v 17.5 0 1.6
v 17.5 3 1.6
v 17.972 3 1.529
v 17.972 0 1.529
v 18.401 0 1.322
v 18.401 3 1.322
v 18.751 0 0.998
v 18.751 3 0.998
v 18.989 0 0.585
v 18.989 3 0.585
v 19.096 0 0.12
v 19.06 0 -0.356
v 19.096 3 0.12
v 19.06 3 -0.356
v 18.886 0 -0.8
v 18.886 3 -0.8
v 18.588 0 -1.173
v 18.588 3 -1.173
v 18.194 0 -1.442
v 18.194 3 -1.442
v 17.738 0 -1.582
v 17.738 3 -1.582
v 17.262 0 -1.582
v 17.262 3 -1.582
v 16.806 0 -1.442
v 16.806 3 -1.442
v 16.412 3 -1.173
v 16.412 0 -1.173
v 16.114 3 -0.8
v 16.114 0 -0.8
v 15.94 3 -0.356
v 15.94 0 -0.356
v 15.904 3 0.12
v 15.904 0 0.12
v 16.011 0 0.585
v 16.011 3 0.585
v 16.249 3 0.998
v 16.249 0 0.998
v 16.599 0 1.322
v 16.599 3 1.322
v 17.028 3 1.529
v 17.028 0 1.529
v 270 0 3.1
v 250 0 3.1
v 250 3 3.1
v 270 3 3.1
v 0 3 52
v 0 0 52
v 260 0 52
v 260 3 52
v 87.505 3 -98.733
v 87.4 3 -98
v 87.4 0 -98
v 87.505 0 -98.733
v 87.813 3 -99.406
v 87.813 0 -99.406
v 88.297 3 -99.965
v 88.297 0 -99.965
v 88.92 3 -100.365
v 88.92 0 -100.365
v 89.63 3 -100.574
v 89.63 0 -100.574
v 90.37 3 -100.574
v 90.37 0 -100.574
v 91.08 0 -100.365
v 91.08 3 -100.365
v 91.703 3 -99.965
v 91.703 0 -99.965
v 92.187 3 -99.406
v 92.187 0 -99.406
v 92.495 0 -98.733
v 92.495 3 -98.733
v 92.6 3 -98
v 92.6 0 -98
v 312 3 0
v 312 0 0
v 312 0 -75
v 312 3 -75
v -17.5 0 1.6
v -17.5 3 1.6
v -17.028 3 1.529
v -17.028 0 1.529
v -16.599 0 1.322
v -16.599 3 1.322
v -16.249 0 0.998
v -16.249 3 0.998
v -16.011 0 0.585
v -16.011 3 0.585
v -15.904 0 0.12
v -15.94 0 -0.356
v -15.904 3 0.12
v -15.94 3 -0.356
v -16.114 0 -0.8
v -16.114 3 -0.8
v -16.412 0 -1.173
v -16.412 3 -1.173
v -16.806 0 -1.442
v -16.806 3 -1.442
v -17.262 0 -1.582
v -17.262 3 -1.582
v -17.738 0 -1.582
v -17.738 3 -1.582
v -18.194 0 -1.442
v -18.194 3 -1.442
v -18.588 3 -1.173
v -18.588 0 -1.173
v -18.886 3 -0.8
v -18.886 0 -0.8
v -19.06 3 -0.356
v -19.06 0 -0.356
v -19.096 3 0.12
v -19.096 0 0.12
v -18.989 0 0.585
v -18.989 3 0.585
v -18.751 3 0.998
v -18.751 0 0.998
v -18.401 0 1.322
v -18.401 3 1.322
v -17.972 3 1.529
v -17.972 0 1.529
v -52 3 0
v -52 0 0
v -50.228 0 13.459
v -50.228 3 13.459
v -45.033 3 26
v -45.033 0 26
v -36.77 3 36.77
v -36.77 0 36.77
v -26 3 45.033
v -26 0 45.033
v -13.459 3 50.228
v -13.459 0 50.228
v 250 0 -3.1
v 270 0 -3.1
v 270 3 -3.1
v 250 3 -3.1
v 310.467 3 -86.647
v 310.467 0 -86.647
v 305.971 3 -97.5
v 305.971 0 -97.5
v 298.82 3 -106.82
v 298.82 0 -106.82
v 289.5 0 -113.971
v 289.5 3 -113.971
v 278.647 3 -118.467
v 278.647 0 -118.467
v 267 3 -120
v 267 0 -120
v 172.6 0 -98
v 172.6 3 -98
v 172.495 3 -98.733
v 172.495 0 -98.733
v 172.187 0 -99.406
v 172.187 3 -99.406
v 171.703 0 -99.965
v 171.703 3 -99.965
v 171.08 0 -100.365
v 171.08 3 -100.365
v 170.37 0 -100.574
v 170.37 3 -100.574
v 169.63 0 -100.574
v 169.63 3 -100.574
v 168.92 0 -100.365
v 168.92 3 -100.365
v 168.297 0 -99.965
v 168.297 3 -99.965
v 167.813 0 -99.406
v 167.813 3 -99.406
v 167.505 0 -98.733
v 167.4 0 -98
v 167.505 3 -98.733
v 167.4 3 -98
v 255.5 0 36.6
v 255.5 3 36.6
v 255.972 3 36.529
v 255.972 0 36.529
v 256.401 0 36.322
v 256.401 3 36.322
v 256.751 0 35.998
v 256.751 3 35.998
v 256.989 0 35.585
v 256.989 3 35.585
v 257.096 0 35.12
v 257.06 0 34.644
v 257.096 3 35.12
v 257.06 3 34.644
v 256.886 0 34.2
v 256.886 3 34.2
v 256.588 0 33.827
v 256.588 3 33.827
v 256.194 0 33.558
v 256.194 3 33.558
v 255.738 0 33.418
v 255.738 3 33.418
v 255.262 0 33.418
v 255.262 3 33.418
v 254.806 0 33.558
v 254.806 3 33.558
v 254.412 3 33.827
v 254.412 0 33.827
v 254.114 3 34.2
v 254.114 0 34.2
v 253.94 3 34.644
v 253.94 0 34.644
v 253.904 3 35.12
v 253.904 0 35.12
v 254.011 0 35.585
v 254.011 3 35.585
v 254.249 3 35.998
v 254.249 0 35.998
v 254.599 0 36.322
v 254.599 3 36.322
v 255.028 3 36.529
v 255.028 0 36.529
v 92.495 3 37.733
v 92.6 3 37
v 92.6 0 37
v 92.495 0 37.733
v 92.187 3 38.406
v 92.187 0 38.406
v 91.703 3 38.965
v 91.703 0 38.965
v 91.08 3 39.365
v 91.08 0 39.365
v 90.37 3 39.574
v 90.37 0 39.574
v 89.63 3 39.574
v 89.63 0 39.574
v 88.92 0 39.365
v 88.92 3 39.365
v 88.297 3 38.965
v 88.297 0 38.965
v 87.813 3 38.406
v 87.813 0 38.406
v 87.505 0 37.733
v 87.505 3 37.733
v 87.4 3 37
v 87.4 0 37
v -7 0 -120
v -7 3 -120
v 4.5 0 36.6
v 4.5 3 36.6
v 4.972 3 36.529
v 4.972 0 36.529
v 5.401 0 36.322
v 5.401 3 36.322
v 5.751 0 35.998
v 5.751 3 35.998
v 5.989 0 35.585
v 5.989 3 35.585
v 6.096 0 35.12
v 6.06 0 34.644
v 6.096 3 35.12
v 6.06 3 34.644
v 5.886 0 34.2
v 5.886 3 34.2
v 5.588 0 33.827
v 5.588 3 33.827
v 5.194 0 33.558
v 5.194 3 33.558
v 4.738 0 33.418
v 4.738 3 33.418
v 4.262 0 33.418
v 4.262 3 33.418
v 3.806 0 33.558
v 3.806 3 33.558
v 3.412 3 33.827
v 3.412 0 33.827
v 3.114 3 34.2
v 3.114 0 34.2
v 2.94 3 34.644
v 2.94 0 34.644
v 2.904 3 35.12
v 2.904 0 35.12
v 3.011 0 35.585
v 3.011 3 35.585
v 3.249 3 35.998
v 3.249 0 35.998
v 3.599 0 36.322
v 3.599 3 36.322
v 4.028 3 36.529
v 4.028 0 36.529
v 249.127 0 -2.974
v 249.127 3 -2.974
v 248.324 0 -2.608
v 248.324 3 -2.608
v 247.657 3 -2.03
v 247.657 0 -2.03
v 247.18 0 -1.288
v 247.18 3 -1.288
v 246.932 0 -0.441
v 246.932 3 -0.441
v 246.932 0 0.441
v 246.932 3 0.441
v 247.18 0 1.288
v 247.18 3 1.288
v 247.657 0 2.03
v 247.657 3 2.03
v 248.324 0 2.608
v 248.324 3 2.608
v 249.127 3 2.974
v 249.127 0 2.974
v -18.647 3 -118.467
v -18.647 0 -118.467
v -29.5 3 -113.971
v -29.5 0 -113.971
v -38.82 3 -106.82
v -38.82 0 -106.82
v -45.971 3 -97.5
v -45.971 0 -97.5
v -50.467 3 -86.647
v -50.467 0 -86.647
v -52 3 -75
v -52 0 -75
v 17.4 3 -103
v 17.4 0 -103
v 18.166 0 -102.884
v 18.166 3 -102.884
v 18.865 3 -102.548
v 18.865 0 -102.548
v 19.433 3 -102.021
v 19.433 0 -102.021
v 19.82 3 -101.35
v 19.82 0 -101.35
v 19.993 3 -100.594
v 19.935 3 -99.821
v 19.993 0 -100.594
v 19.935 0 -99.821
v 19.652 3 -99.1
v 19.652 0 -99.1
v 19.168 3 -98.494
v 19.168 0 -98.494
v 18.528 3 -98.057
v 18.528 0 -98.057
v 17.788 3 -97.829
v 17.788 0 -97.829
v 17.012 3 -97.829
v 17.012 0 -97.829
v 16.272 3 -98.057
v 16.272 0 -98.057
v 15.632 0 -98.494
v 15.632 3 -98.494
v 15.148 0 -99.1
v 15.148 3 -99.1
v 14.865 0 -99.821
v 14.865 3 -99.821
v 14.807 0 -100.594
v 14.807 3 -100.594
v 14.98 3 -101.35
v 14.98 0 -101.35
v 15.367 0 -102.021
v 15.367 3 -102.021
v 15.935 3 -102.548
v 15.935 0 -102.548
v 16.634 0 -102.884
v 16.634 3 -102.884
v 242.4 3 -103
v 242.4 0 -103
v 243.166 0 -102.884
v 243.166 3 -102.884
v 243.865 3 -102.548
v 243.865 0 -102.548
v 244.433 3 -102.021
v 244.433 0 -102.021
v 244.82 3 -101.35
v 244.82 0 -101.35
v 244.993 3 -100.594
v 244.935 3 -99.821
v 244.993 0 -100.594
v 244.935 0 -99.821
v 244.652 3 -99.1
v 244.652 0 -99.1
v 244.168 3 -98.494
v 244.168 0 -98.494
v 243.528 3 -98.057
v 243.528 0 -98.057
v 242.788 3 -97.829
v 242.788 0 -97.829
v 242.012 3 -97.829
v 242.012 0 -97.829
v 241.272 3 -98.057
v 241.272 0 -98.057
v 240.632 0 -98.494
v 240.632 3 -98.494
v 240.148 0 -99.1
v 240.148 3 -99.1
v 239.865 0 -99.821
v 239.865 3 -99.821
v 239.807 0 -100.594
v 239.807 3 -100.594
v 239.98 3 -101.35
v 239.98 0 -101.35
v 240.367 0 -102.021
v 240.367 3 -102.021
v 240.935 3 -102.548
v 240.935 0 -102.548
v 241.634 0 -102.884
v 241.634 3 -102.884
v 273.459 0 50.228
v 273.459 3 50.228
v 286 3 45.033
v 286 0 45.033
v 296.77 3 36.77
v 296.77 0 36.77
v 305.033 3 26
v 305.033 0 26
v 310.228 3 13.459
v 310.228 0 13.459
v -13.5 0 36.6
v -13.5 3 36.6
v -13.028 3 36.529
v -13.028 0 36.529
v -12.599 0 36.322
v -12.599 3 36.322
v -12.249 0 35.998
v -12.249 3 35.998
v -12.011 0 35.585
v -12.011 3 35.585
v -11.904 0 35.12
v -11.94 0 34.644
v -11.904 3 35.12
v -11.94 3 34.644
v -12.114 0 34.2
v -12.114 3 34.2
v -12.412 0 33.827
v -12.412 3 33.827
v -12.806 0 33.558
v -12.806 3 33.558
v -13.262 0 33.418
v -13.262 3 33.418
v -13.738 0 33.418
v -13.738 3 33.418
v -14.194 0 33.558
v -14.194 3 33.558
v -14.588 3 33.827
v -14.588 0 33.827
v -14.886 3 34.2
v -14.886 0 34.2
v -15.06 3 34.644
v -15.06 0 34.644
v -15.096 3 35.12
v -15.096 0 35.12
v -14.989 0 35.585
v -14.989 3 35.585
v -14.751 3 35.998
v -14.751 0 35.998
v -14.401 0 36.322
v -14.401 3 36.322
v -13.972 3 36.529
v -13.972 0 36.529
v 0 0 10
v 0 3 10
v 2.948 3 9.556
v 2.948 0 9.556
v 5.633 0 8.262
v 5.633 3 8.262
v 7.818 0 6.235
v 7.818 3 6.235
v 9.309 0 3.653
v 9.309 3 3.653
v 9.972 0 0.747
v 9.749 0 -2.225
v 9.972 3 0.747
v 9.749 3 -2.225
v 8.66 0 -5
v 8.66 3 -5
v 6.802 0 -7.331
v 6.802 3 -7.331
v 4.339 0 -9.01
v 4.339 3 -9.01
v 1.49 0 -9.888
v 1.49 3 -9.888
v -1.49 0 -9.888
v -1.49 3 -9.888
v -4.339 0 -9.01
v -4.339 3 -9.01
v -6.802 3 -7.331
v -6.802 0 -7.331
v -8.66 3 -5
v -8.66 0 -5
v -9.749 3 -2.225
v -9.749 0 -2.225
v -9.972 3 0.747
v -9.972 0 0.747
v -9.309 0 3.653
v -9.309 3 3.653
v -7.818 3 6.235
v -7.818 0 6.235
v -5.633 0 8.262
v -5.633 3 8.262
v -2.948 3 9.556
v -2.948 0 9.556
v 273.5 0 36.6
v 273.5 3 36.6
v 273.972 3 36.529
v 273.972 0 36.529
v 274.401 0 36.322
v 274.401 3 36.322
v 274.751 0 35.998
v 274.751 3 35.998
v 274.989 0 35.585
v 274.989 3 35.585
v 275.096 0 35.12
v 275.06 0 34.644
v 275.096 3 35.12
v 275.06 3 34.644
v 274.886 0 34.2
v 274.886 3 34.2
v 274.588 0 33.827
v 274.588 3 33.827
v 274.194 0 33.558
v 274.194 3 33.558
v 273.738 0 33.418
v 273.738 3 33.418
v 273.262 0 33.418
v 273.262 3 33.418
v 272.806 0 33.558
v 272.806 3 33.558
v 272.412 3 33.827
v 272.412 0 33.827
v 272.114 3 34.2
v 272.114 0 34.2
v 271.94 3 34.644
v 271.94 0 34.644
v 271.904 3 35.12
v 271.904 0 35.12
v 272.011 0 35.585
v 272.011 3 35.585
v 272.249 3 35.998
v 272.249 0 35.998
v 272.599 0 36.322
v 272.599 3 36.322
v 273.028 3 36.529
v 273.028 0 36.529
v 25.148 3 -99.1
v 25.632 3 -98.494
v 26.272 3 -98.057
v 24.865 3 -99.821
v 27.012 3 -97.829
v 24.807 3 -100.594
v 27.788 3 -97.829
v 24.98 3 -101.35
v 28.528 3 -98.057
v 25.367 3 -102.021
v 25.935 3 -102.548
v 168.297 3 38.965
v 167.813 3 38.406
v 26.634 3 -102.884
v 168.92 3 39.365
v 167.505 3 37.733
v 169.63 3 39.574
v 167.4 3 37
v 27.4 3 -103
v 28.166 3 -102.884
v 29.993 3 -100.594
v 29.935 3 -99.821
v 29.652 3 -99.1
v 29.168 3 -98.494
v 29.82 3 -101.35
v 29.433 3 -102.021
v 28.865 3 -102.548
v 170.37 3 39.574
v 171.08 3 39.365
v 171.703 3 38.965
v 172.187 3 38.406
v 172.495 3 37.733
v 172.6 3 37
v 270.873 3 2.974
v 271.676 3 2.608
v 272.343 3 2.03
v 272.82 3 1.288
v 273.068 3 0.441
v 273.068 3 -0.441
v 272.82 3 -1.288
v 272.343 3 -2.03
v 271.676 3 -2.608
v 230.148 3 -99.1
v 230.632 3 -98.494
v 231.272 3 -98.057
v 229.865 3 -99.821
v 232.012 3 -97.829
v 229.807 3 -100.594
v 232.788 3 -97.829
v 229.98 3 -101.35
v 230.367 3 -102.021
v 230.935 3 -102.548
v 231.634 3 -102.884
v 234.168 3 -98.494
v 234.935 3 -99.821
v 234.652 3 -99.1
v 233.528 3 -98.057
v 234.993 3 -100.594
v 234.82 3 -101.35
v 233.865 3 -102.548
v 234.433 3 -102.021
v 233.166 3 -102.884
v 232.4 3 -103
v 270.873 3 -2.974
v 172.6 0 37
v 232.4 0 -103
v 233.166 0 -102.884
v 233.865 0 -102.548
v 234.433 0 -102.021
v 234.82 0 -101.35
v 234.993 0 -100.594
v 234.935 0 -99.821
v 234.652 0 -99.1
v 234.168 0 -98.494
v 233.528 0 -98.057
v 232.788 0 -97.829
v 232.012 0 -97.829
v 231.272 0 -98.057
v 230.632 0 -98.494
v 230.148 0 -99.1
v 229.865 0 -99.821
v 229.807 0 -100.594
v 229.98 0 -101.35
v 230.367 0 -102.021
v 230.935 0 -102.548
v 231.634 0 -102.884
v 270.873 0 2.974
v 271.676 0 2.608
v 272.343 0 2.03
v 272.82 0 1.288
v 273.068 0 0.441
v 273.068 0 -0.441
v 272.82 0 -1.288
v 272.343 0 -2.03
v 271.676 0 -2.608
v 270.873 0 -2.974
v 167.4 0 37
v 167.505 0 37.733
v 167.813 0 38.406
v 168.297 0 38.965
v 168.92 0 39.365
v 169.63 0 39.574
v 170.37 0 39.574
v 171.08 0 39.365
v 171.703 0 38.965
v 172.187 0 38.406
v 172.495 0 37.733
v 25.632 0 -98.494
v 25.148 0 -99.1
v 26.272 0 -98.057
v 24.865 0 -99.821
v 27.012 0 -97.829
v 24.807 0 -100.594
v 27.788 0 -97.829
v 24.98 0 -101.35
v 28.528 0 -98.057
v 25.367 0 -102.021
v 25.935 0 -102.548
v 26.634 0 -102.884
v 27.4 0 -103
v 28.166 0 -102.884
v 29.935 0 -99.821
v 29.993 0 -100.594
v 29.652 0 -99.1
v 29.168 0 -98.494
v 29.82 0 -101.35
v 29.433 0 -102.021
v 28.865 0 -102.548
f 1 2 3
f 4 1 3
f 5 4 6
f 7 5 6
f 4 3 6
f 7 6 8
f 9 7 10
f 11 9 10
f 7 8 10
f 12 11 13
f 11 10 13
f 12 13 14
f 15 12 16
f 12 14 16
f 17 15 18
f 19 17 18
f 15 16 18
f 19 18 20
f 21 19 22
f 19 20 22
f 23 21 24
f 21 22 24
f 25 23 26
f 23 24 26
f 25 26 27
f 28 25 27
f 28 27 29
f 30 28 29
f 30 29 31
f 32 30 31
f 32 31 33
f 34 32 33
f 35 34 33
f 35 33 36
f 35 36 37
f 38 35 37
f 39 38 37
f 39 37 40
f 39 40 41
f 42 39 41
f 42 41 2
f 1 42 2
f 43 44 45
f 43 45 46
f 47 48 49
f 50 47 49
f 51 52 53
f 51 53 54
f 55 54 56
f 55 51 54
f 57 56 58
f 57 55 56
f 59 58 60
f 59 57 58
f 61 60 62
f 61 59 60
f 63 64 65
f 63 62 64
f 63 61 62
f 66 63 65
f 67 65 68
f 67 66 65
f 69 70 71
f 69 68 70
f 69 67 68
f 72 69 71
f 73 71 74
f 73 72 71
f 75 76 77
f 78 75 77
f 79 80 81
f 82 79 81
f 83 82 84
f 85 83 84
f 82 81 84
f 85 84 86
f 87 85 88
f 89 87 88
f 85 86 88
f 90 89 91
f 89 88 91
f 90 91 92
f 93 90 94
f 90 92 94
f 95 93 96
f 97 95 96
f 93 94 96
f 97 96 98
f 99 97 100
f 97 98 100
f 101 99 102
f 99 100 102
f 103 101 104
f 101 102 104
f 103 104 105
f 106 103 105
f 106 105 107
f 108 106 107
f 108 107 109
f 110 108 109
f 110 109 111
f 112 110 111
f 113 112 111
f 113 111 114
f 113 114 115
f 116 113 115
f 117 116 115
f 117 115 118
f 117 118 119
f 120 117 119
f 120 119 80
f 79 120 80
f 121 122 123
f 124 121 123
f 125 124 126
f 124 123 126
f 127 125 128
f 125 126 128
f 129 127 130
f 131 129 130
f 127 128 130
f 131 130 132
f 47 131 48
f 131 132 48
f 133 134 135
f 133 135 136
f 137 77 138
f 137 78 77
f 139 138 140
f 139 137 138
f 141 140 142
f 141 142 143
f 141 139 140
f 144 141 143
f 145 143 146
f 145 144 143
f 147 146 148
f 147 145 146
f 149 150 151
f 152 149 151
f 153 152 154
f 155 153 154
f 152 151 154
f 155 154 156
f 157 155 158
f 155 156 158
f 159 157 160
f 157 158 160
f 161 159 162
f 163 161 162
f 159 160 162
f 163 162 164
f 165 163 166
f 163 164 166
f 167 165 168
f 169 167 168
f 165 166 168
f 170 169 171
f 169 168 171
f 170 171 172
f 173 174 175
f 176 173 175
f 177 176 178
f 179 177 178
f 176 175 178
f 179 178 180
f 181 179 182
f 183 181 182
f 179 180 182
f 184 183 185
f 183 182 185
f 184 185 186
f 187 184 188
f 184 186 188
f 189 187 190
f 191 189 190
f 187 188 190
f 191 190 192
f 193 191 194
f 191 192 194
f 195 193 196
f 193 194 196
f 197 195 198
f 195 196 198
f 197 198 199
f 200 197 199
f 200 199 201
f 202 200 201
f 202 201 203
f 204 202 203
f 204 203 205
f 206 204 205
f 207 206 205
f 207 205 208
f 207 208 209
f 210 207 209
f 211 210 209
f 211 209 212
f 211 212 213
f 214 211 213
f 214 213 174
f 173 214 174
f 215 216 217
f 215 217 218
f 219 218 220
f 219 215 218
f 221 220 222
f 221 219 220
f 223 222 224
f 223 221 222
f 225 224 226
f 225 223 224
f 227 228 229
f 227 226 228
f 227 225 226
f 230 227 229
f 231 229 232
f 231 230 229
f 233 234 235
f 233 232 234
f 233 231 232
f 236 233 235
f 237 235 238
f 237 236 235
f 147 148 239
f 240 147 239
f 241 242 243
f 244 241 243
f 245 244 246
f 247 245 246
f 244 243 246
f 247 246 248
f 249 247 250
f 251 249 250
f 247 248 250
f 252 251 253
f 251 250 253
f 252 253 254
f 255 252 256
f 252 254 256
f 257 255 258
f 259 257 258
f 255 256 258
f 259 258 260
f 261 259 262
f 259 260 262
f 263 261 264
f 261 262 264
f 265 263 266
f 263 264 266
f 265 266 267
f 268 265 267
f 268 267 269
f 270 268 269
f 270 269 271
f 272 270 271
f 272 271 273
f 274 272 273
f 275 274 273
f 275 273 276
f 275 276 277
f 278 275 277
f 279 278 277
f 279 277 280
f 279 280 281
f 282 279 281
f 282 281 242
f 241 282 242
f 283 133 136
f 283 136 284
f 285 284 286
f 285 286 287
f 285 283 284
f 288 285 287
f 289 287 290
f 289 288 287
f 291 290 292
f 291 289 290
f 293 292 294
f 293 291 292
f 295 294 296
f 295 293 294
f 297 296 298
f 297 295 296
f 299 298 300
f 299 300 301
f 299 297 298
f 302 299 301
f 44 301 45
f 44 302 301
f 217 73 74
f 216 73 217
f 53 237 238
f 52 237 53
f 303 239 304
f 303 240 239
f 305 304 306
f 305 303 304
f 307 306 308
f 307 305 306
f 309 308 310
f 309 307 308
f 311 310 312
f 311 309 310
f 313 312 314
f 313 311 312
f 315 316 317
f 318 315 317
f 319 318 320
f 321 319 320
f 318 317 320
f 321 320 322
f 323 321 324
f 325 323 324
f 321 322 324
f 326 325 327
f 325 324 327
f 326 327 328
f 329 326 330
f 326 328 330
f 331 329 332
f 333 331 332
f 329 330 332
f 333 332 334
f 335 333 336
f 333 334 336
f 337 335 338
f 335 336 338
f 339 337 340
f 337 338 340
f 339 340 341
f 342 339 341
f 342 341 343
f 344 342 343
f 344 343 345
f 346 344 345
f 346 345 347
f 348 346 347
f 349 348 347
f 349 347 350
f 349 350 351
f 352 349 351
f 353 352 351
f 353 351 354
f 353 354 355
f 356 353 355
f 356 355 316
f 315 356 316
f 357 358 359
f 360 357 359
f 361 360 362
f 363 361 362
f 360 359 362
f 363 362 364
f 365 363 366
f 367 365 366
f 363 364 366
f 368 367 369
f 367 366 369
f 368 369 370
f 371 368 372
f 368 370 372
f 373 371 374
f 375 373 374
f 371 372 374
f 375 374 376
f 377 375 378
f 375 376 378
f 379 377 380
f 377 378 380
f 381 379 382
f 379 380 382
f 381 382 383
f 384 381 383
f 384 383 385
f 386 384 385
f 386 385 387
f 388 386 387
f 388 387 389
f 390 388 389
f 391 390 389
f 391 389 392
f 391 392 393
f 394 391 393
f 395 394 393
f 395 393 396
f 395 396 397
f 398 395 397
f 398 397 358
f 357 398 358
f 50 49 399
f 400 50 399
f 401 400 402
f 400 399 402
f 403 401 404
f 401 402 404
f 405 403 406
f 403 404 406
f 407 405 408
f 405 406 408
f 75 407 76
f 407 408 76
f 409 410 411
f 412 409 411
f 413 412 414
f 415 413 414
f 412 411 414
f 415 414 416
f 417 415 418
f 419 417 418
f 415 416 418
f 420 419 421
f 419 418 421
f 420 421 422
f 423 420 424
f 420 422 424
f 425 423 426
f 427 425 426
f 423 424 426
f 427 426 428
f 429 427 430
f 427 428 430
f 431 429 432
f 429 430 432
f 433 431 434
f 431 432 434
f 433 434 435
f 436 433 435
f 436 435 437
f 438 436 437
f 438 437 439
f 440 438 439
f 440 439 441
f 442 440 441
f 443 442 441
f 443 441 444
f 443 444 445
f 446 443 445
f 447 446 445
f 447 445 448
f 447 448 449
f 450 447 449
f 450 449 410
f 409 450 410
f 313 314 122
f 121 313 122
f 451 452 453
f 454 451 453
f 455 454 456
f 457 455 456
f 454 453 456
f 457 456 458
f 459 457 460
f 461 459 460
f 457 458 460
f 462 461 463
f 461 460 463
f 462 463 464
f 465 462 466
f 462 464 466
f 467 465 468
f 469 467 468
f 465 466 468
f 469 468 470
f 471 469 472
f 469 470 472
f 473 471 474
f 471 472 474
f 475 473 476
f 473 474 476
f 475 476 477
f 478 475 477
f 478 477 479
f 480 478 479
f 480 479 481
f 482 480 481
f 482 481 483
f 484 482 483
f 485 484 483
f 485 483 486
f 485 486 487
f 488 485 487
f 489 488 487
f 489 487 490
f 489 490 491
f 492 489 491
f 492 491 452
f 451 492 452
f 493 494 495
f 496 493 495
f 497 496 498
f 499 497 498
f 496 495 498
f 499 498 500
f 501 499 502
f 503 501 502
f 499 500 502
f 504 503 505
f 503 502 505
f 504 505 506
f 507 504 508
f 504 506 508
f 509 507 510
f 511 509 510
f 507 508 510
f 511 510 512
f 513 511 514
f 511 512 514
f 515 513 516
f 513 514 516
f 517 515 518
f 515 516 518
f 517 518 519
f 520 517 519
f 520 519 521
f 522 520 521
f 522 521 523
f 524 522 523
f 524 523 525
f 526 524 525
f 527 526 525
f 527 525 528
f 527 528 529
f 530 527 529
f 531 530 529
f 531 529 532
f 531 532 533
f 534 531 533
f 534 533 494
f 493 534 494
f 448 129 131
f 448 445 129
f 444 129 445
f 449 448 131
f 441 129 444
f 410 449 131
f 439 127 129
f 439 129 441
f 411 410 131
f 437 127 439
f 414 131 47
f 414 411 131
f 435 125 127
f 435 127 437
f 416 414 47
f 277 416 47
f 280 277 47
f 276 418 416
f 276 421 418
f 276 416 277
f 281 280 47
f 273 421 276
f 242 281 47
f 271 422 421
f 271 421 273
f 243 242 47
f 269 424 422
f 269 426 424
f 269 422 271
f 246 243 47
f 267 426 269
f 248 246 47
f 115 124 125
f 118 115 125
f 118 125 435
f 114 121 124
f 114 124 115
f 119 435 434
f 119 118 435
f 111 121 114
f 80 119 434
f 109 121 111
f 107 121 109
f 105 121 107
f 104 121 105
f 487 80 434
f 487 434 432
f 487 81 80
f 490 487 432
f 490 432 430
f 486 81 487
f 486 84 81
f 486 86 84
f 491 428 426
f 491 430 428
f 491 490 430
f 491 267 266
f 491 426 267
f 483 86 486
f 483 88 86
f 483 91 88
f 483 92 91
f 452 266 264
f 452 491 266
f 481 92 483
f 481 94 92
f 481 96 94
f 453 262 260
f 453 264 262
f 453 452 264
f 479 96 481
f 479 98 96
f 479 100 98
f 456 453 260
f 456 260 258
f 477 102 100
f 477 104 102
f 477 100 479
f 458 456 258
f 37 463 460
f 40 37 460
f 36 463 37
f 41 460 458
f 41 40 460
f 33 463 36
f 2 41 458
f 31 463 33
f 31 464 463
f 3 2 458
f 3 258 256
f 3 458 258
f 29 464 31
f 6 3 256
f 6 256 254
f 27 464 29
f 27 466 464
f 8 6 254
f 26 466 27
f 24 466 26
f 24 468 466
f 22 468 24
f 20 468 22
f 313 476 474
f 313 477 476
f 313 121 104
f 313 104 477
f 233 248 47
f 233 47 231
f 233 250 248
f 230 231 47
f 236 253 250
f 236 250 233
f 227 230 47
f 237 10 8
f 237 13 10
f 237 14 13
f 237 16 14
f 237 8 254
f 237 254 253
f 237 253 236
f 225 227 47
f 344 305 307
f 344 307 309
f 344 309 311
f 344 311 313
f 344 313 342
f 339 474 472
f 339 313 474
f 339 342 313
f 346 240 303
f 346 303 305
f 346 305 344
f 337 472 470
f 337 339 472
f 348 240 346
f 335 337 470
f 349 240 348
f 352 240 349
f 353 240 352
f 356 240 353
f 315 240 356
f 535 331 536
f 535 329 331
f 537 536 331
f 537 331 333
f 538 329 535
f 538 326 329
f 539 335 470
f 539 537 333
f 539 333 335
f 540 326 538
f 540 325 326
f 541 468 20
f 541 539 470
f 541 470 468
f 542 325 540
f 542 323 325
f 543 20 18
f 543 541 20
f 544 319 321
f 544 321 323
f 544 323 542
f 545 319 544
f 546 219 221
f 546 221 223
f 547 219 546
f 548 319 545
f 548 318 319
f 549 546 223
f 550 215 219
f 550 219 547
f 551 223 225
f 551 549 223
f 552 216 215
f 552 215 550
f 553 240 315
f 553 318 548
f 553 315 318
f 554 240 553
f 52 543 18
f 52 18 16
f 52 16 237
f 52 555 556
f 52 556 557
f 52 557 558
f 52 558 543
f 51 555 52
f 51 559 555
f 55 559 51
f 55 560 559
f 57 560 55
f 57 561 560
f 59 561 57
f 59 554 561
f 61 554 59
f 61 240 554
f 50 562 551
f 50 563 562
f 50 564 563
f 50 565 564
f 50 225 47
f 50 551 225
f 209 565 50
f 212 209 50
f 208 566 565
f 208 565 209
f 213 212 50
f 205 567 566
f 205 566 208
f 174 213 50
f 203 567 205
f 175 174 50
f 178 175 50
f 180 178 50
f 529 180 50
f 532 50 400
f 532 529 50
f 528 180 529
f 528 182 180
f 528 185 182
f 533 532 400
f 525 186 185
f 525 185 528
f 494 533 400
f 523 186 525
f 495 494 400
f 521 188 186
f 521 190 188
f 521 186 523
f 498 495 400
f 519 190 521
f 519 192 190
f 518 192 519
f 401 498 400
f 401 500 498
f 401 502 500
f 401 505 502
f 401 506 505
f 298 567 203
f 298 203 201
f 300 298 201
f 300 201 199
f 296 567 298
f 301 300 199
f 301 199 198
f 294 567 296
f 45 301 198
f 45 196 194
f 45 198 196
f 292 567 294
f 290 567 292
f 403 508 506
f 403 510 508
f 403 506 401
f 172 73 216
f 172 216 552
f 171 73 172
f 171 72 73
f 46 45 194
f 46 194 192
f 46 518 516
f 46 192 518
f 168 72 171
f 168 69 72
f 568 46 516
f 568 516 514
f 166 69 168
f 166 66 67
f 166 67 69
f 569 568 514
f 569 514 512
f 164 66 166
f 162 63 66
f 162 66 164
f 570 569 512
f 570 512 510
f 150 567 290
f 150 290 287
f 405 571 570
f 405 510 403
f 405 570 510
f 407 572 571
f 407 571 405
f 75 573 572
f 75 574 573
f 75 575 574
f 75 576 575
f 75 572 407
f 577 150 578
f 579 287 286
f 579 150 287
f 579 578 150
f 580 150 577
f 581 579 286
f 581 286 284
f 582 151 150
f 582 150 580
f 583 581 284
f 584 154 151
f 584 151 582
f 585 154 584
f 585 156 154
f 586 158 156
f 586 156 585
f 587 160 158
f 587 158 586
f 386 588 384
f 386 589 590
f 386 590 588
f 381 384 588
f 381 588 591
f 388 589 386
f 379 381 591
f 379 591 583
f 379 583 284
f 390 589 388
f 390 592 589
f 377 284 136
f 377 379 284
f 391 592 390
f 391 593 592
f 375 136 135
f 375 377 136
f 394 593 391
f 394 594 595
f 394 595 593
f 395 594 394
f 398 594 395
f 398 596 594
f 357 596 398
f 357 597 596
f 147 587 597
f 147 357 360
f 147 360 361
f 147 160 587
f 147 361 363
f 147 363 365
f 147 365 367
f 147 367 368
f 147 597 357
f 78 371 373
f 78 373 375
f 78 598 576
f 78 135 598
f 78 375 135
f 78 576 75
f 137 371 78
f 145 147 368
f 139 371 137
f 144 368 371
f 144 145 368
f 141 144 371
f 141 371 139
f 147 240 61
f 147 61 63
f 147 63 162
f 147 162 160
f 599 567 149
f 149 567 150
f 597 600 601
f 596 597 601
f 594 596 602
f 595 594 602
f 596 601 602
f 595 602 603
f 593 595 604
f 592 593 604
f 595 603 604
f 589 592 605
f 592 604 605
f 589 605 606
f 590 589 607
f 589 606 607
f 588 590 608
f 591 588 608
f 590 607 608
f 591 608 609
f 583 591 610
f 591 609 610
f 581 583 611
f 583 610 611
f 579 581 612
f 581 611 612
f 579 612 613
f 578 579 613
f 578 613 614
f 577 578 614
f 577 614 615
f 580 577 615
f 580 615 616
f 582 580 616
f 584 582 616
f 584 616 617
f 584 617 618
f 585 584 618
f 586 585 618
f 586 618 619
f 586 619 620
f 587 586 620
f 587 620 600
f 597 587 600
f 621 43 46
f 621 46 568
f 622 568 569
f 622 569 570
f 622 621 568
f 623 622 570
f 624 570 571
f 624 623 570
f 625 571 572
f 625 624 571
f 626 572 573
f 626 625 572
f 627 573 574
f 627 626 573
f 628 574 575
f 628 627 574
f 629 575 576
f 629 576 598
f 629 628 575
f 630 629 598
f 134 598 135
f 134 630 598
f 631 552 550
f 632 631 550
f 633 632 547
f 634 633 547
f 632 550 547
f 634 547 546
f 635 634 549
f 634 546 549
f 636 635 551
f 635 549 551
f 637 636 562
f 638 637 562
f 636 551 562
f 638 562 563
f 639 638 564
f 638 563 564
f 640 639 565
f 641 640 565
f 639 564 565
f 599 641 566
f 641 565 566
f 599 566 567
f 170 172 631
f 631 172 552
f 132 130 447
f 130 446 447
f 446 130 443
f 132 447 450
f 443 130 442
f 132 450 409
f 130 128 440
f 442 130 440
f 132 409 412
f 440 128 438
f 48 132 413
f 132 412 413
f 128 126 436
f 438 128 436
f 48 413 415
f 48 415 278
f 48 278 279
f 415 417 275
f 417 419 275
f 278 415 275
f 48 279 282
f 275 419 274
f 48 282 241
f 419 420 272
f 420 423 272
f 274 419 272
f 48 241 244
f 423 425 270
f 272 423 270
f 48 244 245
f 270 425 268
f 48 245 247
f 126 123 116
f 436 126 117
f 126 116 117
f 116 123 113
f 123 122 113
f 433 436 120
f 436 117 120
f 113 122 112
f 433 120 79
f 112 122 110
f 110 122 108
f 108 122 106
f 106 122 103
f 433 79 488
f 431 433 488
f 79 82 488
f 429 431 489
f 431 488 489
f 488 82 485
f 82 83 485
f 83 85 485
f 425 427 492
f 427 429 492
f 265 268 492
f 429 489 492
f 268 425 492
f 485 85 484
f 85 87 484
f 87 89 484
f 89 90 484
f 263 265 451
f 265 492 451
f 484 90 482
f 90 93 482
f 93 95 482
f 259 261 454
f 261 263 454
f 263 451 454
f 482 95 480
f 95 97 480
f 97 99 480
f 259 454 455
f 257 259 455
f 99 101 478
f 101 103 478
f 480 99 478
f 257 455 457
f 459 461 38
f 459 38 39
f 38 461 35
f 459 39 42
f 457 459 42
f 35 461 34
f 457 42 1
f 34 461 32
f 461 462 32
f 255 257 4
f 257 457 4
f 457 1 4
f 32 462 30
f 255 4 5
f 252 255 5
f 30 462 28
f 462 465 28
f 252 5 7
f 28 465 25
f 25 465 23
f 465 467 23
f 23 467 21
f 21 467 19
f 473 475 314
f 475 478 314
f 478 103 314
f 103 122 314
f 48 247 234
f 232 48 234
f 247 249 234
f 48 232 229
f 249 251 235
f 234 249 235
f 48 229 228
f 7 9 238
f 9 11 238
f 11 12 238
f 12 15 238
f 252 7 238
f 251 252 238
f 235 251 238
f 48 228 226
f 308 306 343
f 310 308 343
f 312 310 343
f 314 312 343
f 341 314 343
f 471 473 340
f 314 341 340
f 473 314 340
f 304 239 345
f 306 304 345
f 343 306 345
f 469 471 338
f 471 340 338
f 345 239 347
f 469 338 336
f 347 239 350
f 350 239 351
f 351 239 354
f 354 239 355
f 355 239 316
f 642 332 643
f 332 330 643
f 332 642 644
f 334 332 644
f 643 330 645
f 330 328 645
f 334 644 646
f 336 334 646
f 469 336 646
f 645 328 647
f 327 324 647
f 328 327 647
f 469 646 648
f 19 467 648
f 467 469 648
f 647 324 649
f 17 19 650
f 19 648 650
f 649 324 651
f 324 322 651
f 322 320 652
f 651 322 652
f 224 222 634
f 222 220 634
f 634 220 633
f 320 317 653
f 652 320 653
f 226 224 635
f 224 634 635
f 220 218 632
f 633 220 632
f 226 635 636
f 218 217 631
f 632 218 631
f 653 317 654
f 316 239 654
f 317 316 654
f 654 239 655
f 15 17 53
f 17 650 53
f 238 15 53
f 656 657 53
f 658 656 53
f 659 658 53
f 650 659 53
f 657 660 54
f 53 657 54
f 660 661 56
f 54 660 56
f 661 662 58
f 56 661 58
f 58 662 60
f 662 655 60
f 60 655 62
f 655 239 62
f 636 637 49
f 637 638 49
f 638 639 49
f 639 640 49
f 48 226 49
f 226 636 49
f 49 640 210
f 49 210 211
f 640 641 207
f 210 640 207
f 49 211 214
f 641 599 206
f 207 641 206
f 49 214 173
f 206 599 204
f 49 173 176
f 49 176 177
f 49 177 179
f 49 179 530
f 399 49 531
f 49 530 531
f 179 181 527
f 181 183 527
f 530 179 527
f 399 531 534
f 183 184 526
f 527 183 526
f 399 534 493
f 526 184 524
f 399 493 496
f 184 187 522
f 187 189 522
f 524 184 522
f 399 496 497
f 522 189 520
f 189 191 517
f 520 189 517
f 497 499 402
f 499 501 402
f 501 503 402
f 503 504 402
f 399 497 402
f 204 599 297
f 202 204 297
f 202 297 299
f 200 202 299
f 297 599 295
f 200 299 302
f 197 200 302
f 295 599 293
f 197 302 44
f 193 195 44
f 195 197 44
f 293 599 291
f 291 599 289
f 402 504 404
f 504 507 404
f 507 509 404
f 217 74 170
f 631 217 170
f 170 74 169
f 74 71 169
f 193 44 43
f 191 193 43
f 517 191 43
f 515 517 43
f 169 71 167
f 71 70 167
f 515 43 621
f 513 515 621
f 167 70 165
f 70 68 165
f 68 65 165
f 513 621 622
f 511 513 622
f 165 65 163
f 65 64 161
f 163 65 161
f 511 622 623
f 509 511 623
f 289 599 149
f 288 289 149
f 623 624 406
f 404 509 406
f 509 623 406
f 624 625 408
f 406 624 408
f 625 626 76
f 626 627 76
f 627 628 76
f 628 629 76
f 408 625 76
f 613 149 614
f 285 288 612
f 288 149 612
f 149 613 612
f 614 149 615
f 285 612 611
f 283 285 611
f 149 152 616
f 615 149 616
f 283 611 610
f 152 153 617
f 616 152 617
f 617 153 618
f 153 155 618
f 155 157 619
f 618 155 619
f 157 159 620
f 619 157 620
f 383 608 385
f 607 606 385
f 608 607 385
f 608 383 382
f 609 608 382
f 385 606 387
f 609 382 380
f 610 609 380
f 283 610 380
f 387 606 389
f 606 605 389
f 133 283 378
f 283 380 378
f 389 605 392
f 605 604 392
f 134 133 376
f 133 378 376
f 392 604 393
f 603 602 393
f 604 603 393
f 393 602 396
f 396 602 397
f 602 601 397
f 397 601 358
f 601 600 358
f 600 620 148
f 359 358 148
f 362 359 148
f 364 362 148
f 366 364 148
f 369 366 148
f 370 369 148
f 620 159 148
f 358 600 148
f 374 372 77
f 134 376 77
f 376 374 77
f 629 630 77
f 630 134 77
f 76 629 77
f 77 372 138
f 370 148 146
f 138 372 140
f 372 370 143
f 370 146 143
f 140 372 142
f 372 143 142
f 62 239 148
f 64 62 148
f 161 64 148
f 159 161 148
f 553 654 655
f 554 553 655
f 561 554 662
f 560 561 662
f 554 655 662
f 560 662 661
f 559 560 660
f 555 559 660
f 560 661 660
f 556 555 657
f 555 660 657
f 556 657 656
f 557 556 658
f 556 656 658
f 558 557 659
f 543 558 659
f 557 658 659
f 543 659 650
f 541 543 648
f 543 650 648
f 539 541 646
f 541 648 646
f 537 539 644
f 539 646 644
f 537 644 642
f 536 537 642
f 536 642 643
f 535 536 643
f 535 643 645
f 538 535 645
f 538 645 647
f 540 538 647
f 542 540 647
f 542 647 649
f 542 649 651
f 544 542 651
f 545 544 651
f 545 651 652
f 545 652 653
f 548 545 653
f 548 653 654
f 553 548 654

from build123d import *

# Parameters (mm, degrees)
SKETCH1_R           = 3.1
BOSS_EXTRUDE1_DEPTH = 3
CUT_EXTRUDE1_DEPTH  = 335.294780097
FILLET1_R           = 45
SKETCH3_R           = 10
CUT_EXTRUDE2_DEPTH  = 335.294780097
SKETCH4_R           = 2.6
CUT_EXTRUDE3_DEPTH  = 335.294780097
SKETCH5_R           = 1.6
CUT_EXTRUDE4_DEPTH  = 335.294780097
SKETCH6_R           = 1.6
CUT_EXTRUDE5_DEPTH  = 335.294780097


with BuildPart() as part:
    # Sketch1 → Boss-Extrude1 (new body)
    # profile 1 of 2: a face of its own
    with BuildSketch(Plane(origin=(0, 0, 0), x_dir=(1, 0, 0), z_dir=(0, 1, 0))):
        with BuildLine():
            Line((0, -52), (260, -52))
            ThreePointArc((260, -52), (312, 0), (260, 52))
            Line((260, 52), (0, 52))
            ThreePointArc((0, 52), (-52, 0), (0, -52))
        make_face()
        with Locations(Location((0, 0, 0), (0, 0, 270))):
            Circle(SKETCH1_R, mode=Mode.SUBTRACT)
        with BuildLine():
            ThreePointArc((250, 3.1), (246.9, 0), (250, -3.1))
            Line((250, -3.1), (270, -3.1))
            ThreePointArc((270, -3.1), (273.1, 0), (270, 3.1))
            Line((270, 3.1), (250, 3.1))
        make_face(mode=Mode.SUBTRACT)
    # profile 2 of 2: a face of its own
    with BuildSketch(Plane(origin=(0, 0, 0), x_dir=(1, 0, 0), z_dir=(0, 1, 0))):
        with BuildLine():
            ThreePointArc((-52, 0), (-36.769552622, 36.769552622), (0, 52))
            Line((0, 52), (260, 52))
            ThreePointArc((260, 52), (296.769552622, 36.769552622), (312, 0))
            Line((312, 0), (312, 120))
            Line((312, 120), (-52, 120))
            Line((-52, 120), (-52, 0))
        make_face()
    extrude(amount=BOSS_EXTRUDE1_DEPTH)

    # Sketch2 → Cut-Extrude1 (cut, through all)
    with BuildSketch(Plane(origin=(0, 3, 0), x_dir=(1, 0, 0), z_dir=(0, 1, 0))):
        with BuildLine():
            Line((87.4, -37), (87.4, 98))
            ThreePointArc((87.4, 98), (90, 100.6), (92.6, 98))
            Line((92.6, 98), (92.6, -37))
            ThreePointArc((92.6, -37), (90, -39.6), (87.4, -37))
        make_face()
        with BuildLine():
            Line((172.6, -37), (172.6, 98))
            ThreePointArc((172.6, 98), (170, 100.6), (167.4, 98))
            Line((167.4, 98), (167.4, -37))
            ThreePointArc((167.4, -37), (170, -39.6), (172.6, -37))
        make_face()
    extrude(amount=-CUT_EXTRUDE1_DEPTH, mode=Mode.SUBTRACT)

    # Fillet1
    fillet1_edges = [part.edges().sort_by_distance(p)[0] for p in [
        (-52, 1.5, -120),
        (312, 1.5, -120),
    ]]
    fillet(fillet1_edges, radius=FILLET1_R)

    # Sketch3 → Cut-Extrude2 (cut, through all)
    with BuildSketch(Plane(origin=(0, 3, 0), x_dir=(1, 0, 0), z_dir=(0, 1, 0))):
        with Locations(Location((0, 0, 0), (0, 0, 270))):
            Circle(SKETCH3_R)
    extrude(amount=-CUT_EXTRUDE2_DEPTH, mode=Mode.SUBTRACT)

    # Sketch4 → Cut-Extrude3 (cut, through all)
    with BuildSketch(Plane.XZ):
        with Locations(Location((17.4, -100.4, 0), (0, 0, 270))):
            Circle(SKETCH4_R)
        with Locations(Location((27.4, -100.4, 0), (0, 0, 270))):
            Circle(SKETCH4_R)
        with Locations(Location((232.4, -100.4, 0), (0, 0, 270))):
            Circle(SKETCH4_R)
        with Locations(Location((242.4, -100.4, 0), (0, 0, 270))):
            Circle(SKETCH4_R)
    extrude(amount=-CUT_EXTRUDE3_DEPTH, mode=Mode.SUBTRACT)

    # Sketch5 → Cut-Extrude4 (cut, through all)
    with BuildSketch(Plane(origin=(0, 3, 0), x_dir=(1, 0, 0), z_dir=(0, 1, 0))):
        with Locations(Location((-17.5, 0, 0), (0, 0, 270))):
            Circle(SKETCH5_R)
        with Locations(Location((17.5, 0, 0), (0, 0, 270))):
            Circle(SKETCH5_R)
    extrude(amount=-CUT_EXTRUDE4_DEPTH, mode=Mode.SUBTRACT)

    # Sketch6 → Cut-Extrude5 (cut, through all)
    with BuildSketch(Plane(origin=(0, 3, 0), x_dir=(1, 0, 0), z_dir=(0, 1, 0))):
        with Locations(Location((-13.5, -35, 0), (0, 0, 270))):
            Circle(SKETCH6_R)
        with Locations(Location((4.5, -35, 0), (0, 0, 270))):
            Circle(SKETCH6_R)
        with Locations(Location((255.5, -35, 0), (0, 0, 270))):
            Circle(SKETCH6_R)
        with Locations(Location((273.5, -35, 0), (0, 0, 270))):
            Circle(SKETCH6_R)
    extrude(amount=-CUT_EXTRUDE5_DEPTH, mode=Mode.SUBTRACT)


solid = part.part
